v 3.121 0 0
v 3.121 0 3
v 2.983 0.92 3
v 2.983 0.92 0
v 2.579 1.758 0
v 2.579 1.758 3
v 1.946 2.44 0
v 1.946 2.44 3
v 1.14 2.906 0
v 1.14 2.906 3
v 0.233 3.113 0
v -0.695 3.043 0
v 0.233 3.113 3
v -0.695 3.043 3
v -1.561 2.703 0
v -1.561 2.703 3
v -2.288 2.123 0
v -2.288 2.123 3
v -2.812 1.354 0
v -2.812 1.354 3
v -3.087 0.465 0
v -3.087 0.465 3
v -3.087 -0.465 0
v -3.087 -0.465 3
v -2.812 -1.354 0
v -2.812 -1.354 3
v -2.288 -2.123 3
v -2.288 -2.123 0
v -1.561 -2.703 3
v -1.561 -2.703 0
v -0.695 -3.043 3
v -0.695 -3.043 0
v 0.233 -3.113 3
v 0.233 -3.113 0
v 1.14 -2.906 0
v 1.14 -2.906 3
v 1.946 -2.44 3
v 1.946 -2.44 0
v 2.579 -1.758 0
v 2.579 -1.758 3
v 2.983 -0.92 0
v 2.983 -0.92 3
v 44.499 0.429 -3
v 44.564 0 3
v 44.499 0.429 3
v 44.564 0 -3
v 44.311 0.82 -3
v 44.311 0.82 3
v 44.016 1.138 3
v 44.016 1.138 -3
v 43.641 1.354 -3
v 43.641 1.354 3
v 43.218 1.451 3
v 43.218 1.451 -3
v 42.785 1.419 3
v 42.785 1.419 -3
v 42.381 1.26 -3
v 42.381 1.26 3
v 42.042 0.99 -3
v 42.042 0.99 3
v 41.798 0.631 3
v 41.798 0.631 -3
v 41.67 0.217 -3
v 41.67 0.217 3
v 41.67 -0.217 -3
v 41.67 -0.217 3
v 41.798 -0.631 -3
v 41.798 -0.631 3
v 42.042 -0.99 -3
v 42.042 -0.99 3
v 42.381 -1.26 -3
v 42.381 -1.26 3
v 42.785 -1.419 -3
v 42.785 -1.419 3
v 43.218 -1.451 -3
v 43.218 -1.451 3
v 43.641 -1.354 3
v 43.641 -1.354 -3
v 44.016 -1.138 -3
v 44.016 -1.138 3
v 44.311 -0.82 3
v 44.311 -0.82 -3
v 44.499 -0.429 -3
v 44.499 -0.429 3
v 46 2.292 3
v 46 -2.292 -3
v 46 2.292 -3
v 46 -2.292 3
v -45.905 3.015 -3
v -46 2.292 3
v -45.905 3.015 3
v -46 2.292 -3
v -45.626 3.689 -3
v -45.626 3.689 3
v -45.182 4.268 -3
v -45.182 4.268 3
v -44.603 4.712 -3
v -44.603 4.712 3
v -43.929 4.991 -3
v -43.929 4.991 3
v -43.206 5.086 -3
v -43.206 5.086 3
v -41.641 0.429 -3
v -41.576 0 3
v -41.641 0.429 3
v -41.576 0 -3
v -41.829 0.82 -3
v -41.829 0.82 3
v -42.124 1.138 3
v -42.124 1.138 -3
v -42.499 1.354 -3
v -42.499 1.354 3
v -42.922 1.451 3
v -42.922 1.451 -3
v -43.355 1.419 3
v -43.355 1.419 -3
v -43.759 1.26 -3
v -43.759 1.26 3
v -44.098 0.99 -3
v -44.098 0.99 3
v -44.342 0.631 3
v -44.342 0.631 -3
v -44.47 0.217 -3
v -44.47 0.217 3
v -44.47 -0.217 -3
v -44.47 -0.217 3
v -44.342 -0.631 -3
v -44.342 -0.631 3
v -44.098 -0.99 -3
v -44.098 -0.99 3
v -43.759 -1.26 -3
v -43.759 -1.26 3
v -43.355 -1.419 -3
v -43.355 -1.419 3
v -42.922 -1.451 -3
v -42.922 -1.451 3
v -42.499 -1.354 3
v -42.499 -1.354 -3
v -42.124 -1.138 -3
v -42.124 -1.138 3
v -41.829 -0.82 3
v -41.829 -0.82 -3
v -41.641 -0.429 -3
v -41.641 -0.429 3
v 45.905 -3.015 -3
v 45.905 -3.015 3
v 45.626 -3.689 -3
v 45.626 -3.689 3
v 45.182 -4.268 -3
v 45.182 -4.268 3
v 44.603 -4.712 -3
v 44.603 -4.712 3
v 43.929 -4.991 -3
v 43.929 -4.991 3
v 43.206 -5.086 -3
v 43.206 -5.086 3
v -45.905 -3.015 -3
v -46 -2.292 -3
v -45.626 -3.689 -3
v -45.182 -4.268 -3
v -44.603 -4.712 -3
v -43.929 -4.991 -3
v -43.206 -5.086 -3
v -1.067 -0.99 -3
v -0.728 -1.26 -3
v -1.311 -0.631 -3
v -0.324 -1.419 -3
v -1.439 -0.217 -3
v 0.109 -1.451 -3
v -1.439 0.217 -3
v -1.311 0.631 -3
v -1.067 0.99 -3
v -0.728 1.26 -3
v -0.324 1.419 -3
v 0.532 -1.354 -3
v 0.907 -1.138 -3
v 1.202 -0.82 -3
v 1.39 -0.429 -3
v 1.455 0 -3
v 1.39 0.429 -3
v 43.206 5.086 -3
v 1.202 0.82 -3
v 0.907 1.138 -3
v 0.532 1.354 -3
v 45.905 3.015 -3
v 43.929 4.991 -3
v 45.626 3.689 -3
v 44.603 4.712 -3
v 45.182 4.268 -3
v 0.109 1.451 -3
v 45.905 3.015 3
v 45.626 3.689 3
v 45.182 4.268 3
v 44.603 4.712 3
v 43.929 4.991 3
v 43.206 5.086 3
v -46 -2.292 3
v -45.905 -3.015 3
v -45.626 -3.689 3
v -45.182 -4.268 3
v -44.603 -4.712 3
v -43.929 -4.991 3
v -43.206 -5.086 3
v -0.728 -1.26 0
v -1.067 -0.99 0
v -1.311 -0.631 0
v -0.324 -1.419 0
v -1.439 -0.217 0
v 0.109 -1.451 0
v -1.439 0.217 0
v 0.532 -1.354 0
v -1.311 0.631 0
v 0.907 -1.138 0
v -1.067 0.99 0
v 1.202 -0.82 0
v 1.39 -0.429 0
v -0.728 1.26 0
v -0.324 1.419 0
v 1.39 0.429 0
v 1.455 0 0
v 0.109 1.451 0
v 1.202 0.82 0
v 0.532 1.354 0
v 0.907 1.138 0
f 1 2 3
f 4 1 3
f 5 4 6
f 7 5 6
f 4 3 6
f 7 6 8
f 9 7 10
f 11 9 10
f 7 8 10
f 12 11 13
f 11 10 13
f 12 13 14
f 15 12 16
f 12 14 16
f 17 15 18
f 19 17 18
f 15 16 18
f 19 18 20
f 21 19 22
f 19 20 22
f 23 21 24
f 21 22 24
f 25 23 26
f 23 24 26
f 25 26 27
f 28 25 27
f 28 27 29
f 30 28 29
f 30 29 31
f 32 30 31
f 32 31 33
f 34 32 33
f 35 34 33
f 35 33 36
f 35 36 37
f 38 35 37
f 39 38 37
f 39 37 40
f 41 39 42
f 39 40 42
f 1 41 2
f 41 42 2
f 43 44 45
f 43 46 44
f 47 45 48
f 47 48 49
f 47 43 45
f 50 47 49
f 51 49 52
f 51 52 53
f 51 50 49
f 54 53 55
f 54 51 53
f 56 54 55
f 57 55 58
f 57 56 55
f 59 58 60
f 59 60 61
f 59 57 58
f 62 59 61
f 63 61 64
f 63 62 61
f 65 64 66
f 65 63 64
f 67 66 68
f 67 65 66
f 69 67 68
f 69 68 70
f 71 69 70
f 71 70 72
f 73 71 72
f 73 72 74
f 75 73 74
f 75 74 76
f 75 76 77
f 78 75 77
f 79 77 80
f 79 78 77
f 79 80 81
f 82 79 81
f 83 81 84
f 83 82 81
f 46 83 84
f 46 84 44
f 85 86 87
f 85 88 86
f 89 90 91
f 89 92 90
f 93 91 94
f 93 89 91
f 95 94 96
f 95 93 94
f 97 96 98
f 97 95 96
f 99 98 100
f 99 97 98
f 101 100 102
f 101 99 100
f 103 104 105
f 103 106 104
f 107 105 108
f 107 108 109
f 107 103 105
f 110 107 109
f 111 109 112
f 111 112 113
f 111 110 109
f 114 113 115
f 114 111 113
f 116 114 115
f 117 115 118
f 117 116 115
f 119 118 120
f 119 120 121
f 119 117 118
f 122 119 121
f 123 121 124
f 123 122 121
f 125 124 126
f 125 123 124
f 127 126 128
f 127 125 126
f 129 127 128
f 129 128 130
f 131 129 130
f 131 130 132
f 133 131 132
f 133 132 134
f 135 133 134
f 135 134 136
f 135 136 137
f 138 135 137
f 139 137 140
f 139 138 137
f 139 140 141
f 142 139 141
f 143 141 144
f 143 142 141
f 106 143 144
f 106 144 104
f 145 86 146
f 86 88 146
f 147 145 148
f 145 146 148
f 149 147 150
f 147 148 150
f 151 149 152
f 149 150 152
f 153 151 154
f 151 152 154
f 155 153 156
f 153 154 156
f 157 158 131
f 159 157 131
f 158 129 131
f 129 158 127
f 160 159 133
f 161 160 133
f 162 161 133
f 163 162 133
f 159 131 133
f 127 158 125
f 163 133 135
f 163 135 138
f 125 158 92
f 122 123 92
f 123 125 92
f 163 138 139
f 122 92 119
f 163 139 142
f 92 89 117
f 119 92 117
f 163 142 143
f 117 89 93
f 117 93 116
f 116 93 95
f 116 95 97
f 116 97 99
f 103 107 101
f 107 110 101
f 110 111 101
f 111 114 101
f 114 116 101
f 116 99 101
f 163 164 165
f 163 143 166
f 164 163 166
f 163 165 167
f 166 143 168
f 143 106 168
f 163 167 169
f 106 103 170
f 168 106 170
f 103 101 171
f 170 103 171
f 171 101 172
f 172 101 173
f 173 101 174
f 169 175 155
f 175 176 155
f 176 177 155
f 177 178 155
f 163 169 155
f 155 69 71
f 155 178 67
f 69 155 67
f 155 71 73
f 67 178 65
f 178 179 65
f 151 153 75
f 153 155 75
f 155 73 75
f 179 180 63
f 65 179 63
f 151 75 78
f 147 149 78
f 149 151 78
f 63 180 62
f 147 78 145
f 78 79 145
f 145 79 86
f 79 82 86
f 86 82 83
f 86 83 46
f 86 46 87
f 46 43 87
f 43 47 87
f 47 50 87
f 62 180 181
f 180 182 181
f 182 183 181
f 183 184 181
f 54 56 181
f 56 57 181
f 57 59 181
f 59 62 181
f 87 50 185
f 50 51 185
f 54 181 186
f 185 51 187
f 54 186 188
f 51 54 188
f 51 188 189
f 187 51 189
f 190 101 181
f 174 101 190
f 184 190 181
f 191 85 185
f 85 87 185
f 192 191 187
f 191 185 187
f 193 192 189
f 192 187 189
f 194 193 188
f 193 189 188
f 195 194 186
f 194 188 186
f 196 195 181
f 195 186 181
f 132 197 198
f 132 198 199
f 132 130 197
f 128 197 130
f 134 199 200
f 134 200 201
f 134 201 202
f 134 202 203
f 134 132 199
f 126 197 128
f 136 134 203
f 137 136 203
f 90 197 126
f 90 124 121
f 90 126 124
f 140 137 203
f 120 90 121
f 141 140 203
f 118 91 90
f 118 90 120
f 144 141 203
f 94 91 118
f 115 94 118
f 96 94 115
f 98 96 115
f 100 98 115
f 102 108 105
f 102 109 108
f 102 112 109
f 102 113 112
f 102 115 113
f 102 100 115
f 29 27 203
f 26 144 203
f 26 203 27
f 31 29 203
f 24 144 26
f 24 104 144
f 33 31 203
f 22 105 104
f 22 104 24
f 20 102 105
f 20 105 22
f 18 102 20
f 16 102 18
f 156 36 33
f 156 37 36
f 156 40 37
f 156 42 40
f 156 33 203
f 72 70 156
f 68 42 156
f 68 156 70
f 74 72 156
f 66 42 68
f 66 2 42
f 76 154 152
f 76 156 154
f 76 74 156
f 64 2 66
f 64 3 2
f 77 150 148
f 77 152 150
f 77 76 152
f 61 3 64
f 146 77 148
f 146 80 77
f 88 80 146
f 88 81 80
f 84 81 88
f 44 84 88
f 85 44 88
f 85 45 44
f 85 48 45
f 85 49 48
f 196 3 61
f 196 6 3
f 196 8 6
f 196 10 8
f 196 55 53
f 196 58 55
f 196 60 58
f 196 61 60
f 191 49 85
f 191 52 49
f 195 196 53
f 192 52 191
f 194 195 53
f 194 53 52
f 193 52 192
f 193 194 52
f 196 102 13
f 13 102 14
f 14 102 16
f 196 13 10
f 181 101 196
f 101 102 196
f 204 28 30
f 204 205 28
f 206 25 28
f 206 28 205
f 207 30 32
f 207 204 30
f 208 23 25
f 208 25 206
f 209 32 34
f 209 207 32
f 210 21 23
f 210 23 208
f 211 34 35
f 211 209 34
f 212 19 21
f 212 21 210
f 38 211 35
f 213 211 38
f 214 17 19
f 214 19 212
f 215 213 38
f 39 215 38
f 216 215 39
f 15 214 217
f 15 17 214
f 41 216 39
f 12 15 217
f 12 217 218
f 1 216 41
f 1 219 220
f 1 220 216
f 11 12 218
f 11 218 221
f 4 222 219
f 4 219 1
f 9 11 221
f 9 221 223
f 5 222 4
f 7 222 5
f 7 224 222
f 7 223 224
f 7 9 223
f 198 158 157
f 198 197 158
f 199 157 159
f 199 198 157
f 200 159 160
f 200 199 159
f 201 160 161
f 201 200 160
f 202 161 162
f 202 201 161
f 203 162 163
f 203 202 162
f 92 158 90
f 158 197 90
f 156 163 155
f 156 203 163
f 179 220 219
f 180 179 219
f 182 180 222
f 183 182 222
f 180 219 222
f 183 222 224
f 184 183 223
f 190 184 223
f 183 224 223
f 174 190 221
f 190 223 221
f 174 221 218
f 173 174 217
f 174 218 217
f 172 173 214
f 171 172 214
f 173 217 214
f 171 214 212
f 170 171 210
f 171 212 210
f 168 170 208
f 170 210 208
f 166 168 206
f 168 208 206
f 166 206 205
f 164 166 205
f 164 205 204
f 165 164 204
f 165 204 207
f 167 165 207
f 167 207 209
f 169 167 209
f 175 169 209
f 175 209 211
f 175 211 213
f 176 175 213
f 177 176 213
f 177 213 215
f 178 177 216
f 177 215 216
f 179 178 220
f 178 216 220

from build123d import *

# Parameters (mm, degrees)
F0_W     = 92
F0_H     = 10.172608
F0_R     = 1.455
F1_DEPTH = 3
F2_R     = 2.794
F3_R     = 3.121392
F4_DEPTH = 3
F5_R     = 1.455
F6_DEPTH = 3


with BuildPart() as f1:
    # F0 (on Top) → F1 (new body, symmetric)
    with BuildSketch(Plane.XY):
        Rectangle(F0_W, F0_H)
        with Locations((-43.031044, 0)):
            Circle(F0_R, mode=Mode.SUBTRACT)
        with Locations((43.108956, 0)):
            Circle(F0_R, mode=Mode.SUBTRACT)
    extrude(amount=F1_DEPTH, both=True)

    # F2
    f2_edges = [f1.edges().sort_by_distance(p)[0] for p in [
        (-46, 5.086304, 0),
        (-46, -5.086304, 0),
        (46, 5.086304, 0),
        (46, -5.086304, 0),
    ]]
    fillet(f2_edges, radius=F2_R)

    # F3 (on face) → F4 (cut, symmetric)
    with BuildSketch(Plane.XY.offset(3)):
        Circle(F3_R)
    extrude(amount=F4_DEPTH, both=True, mode=Mode.SUBTRACT)

    # F5 (on Top) → F6 (cut, symmetric)
    with BuildSketch(Plane.XY):
        Circle(F5_R)
    extrude(amount=F6_DEPTH, both=True, mode=Mode.SUBTRACT)


solid = f1.part
